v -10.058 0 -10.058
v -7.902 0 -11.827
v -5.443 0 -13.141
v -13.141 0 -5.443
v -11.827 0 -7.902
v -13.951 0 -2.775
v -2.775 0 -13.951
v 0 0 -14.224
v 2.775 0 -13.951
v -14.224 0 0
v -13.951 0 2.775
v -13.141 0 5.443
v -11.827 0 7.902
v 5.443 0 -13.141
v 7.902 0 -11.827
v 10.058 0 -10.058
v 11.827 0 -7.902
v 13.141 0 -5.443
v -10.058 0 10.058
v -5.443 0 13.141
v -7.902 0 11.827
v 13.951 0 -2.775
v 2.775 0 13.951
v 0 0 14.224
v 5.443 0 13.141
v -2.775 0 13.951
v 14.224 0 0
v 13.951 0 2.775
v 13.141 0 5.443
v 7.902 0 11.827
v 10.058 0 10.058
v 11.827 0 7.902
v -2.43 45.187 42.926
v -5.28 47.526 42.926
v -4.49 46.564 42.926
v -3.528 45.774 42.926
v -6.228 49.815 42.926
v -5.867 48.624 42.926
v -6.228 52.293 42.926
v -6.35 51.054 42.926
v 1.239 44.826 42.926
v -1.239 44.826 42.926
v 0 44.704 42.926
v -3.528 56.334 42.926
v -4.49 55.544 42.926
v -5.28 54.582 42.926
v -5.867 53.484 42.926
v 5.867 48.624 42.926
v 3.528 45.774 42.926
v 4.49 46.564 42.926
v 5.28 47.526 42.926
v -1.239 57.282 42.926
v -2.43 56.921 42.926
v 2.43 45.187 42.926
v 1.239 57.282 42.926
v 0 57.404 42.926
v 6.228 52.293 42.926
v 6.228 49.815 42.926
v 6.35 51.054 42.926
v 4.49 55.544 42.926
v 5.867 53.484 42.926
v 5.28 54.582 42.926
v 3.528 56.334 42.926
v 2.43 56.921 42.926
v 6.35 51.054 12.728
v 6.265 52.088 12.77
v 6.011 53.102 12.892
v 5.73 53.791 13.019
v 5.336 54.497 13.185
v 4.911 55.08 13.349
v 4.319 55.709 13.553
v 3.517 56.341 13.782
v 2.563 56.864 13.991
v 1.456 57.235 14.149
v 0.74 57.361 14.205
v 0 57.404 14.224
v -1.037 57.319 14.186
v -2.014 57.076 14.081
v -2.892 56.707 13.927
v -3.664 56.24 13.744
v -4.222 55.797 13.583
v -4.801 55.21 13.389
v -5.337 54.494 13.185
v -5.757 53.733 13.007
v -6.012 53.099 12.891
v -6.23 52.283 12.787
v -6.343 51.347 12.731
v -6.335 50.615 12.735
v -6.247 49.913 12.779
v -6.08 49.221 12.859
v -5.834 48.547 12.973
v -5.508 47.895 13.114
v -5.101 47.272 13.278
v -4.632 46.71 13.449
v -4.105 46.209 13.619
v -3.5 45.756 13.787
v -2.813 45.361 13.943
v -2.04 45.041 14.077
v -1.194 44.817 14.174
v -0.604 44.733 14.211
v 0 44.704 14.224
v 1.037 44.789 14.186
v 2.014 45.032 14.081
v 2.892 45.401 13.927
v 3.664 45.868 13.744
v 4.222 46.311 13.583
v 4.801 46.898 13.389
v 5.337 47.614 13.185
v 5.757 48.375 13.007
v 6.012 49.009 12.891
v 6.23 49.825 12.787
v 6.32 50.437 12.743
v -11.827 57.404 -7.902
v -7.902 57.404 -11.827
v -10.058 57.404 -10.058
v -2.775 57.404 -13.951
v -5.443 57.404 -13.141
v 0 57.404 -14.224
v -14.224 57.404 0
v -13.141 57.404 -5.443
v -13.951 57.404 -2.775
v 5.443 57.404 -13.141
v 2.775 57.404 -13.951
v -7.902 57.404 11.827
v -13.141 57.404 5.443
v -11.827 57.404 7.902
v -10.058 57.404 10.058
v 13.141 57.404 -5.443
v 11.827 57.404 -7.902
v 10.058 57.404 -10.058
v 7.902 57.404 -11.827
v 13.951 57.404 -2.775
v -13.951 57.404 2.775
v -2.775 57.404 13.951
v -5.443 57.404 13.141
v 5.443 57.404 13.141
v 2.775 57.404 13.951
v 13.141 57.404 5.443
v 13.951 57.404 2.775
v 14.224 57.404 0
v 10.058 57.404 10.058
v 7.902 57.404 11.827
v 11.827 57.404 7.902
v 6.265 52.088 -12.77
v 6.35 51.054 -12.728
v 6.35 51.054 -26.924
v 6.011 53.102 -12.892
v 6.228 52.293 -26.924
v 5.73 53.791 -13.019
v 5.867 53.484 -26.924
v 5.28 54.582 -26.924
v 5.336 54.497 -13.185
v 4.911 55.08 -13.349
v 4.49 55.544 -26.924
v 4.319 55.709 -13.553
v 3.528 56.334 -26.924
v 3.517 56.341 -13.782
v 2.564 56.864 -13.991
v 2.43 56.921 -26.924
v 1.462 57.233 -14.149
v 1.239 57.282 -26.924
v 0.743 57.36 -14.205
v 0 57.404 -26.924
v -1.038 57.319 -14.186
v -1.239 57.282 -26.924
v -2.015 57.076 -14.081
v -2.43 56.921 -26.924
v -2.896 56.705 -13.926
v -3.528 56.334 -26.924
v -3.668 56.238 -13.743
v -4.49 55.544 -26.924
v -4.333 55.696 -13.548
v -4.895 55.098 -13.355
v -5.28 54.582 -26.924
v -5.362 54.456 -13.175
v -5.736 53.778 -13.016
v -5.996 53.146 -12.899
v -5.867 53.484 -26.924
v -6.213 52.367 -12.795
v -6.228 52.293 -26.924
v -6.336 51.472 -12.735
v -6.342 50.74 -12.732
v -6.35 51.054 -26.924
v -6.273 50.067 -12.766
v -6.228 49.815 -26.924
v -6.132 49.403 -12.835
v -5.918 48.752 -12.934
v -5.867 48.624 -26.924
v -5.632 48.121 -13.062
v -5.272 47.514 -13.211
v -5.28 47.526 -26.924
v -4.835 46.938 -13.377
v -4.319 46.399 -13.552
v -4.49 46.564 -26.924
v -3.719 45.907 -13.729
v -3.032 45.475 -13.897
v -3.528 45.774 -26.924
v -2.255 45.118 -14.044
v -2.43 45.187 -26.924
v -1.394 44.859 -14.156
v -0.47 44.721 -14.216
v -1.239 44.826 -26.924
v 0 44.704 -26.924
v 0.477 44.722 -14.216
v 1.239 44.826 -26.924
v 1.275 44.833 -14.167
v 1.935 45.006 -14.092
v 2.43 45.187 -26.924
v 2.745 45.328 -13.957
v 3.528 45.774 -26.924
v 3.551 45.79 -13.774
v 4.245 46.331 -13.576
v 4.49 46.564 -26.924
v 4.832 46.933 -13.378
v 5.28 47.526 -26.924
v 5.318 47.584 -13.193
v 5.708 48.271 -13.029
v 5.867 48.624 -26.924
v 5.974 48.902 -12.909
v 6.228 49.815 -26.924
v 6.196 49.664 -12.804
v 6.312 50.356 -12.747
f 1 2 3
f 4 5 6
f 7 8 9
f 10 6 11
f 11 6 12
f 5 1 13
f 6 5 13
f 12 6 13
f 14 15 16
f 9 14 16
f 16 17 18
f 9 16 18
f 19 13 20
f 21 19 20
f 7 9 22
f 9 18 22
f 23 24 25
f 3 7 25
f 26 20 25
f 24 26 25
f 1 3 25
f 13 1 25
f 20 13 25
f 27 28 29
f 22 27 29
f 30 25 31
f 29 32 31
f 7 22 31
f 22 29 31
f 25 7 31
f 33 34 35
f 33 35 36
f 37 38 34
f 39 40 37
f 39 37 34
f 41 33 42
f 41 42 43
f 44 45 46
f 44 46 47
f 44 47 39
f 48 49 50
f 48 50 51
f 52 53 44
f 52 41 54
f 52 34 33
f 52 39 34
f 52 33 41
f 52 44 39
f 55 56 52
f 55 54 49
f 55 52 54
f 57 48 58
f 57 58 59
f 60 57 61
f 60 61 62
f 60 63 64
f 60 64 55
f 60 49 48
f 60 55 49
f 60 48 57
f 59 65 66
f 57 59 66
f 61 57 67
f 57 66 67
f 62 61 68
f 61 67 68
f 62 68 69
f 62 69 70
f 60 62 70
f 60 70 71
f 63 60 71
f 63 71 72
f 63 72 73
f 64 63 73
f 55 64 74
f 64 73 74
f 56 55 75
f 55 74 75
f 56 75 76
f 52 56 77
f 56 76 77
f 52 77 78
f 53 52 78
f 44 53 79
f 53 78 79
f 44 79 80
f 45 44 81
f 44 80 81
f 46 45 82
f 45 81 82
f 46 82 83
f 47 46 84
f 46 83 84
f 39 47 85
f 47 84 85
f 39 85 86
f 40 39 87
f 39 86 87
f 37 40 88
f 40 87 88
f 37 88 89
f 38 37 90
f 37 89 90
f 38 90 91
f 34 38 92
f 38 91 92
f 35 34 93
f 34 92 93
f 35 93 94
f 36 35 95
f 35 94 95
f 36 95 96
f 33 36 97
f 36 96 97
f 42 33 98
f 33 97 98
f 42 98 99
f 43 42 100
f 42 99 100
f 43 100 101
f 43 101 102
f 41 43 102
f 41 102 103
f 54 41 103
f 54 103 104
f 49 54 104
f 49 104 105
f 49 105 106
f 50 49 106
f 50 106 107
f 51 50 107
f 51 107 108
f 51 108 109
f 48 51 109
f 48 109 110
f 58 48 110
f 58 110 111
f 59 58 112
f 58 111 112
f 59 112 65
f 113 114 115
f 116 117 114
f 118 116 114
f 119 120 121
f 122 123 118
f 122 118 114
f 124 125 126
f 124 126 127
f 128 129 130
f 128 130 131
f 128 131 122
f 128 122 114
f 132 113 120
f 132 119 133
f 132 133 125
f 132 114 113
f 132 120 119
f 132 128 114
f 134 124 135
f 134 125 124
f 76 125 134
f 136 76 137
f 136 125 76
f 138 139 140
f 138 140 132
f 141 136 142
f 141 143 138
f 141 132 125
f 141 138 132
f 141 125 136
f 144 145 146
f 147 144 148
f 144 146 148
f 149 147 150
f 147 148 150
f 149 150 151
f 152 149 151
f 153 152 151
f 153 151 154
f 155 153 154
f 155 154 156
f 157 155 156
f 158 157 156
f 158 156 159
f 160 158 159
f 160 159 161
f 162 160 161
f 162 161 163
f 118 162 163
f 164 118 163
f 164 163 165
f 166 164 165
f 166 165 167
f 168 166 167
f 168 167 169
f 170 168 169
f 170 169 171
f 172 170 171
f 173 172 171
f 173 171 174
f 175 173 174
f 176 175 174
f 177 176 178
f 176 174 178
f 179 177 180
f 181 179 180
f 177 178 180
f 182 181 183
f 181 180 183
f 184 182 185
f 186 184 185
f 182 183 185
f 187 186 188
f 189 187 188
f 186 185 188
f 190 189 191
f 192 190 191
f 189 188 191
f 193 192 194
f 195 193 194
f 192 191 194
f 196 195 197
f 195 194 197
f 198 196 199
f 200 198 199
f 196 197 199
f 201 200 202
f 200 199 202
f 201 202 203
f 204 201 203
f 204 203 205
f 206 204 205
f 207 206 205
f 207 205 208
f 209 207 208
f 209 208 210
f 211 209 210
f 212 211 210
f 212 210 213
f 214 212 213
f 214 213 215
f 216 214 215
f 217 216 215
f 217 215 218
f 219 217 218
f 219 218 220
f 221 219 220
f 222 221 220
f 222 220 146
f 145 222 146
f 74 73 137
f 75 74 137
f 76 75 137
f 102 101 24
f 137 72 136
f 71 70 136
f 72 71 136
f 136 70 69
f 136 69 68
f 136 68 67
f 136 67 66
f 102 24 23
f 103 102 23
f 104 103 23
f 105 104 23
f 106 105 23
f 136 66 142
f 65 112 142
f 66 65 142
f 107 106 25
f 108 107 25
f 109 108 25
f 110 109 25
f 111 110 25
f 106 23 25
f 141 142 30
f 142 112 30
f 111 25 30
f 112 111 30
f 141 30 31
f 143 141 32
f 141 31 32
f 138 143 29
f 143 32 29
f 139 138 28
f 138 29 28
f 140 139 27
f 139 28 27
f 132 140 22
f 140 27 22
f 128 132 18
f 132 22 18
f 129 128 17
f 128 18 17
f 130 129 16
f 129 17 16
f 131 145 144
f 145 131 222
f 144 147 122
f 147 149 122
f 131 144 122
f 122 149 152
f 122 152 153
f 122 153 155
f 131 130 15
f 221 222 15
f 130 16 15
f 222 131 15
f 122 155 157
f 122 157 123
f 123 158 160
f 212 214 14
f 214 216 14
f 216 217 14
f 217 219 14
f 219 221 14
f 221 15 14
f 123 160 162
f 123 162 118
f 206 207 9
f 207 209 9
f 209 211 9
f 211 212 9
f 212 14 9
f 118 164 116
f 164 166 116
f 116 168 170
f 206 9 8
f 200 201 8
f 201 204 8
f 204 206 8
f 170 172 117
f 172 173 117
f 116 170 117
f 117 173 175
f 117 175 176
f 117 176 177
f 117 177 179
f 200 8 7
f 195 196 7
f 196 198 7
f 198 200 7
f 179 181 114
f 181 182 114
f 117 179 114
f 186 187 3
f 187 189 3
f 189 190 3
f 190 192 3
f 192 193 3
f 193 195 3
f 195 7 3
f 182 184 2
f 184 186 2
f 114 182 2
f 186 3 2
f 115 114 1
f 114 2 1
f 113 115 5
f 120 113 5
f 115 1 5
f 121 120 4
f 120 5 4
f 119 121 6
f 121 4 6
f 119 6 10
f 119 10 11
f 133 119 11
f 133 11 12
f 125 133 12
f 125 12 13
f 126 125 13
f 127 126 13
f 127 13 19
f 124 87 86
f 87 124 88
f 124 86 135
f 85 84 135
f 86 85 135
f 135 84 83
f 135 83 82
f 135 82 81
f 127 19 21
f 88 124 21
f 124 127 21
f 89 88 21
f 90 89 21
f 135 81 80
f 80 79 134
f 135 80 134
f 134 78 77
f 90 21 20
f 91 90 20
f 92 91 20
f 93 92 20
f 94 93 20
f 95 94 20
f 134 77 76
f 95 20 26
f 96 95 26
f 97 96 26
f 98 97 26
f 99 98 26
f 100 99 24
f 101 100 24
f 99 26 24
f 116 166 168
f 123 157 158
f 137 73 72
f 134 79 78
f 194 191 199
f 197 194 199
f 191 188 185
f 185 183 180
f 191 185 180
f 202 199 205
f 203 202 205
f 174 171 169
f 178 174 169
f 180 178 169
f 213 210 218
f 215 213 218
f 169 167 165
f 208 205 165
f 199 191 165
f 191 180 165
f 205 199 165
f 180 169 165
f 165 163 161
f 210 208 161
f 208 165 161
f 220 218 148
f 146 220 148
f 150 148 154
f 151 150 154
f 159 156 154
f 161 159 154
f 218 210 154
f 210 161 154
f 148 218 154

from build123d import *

# Parameters (mm, degrees)
SKETCH2_R                = 14.224
BOSS_EXTRUDE1_DEPTH      = 57.404
BOSS_EXTRUDE2_DEPTH      = 28.702
BOSS_EXTRUDE2_DEPTH_BACK = 41.148
SKETCH3_R                = 6.35


with BuildPart() as part:
    # Sketch2 → Boss-Extrude1 (new body)
    with BuildSketch(Plane(origin=(0, 0, 0), x_dir=(1, 0, 0), z_dir=(0, 1, 0))):
        with Locations(Location((0, 0, 0), (0, 0, 270))):
            Circle(SKETCH2_R)
    extrude(amount=BOSS_EXTRUDE1_DEPTH)

    # Sketch3 → Boss-Extrude2 (add, two sides: drawn at the far end of the back side and taken through both)
    with BuildSketch(Plane.XY.offset(14.224).offset(-BOSS_EXTRUDE2_DEPTH_BACK)):
        with Locations((0, 51.054)):
            Circle(SKETCH3_R)
    extrude(amount=BOSS_EXTRUDE2_DEPTH + BOSS_EXTRUDE2_DEPTH_BACK)


solid = part.part
